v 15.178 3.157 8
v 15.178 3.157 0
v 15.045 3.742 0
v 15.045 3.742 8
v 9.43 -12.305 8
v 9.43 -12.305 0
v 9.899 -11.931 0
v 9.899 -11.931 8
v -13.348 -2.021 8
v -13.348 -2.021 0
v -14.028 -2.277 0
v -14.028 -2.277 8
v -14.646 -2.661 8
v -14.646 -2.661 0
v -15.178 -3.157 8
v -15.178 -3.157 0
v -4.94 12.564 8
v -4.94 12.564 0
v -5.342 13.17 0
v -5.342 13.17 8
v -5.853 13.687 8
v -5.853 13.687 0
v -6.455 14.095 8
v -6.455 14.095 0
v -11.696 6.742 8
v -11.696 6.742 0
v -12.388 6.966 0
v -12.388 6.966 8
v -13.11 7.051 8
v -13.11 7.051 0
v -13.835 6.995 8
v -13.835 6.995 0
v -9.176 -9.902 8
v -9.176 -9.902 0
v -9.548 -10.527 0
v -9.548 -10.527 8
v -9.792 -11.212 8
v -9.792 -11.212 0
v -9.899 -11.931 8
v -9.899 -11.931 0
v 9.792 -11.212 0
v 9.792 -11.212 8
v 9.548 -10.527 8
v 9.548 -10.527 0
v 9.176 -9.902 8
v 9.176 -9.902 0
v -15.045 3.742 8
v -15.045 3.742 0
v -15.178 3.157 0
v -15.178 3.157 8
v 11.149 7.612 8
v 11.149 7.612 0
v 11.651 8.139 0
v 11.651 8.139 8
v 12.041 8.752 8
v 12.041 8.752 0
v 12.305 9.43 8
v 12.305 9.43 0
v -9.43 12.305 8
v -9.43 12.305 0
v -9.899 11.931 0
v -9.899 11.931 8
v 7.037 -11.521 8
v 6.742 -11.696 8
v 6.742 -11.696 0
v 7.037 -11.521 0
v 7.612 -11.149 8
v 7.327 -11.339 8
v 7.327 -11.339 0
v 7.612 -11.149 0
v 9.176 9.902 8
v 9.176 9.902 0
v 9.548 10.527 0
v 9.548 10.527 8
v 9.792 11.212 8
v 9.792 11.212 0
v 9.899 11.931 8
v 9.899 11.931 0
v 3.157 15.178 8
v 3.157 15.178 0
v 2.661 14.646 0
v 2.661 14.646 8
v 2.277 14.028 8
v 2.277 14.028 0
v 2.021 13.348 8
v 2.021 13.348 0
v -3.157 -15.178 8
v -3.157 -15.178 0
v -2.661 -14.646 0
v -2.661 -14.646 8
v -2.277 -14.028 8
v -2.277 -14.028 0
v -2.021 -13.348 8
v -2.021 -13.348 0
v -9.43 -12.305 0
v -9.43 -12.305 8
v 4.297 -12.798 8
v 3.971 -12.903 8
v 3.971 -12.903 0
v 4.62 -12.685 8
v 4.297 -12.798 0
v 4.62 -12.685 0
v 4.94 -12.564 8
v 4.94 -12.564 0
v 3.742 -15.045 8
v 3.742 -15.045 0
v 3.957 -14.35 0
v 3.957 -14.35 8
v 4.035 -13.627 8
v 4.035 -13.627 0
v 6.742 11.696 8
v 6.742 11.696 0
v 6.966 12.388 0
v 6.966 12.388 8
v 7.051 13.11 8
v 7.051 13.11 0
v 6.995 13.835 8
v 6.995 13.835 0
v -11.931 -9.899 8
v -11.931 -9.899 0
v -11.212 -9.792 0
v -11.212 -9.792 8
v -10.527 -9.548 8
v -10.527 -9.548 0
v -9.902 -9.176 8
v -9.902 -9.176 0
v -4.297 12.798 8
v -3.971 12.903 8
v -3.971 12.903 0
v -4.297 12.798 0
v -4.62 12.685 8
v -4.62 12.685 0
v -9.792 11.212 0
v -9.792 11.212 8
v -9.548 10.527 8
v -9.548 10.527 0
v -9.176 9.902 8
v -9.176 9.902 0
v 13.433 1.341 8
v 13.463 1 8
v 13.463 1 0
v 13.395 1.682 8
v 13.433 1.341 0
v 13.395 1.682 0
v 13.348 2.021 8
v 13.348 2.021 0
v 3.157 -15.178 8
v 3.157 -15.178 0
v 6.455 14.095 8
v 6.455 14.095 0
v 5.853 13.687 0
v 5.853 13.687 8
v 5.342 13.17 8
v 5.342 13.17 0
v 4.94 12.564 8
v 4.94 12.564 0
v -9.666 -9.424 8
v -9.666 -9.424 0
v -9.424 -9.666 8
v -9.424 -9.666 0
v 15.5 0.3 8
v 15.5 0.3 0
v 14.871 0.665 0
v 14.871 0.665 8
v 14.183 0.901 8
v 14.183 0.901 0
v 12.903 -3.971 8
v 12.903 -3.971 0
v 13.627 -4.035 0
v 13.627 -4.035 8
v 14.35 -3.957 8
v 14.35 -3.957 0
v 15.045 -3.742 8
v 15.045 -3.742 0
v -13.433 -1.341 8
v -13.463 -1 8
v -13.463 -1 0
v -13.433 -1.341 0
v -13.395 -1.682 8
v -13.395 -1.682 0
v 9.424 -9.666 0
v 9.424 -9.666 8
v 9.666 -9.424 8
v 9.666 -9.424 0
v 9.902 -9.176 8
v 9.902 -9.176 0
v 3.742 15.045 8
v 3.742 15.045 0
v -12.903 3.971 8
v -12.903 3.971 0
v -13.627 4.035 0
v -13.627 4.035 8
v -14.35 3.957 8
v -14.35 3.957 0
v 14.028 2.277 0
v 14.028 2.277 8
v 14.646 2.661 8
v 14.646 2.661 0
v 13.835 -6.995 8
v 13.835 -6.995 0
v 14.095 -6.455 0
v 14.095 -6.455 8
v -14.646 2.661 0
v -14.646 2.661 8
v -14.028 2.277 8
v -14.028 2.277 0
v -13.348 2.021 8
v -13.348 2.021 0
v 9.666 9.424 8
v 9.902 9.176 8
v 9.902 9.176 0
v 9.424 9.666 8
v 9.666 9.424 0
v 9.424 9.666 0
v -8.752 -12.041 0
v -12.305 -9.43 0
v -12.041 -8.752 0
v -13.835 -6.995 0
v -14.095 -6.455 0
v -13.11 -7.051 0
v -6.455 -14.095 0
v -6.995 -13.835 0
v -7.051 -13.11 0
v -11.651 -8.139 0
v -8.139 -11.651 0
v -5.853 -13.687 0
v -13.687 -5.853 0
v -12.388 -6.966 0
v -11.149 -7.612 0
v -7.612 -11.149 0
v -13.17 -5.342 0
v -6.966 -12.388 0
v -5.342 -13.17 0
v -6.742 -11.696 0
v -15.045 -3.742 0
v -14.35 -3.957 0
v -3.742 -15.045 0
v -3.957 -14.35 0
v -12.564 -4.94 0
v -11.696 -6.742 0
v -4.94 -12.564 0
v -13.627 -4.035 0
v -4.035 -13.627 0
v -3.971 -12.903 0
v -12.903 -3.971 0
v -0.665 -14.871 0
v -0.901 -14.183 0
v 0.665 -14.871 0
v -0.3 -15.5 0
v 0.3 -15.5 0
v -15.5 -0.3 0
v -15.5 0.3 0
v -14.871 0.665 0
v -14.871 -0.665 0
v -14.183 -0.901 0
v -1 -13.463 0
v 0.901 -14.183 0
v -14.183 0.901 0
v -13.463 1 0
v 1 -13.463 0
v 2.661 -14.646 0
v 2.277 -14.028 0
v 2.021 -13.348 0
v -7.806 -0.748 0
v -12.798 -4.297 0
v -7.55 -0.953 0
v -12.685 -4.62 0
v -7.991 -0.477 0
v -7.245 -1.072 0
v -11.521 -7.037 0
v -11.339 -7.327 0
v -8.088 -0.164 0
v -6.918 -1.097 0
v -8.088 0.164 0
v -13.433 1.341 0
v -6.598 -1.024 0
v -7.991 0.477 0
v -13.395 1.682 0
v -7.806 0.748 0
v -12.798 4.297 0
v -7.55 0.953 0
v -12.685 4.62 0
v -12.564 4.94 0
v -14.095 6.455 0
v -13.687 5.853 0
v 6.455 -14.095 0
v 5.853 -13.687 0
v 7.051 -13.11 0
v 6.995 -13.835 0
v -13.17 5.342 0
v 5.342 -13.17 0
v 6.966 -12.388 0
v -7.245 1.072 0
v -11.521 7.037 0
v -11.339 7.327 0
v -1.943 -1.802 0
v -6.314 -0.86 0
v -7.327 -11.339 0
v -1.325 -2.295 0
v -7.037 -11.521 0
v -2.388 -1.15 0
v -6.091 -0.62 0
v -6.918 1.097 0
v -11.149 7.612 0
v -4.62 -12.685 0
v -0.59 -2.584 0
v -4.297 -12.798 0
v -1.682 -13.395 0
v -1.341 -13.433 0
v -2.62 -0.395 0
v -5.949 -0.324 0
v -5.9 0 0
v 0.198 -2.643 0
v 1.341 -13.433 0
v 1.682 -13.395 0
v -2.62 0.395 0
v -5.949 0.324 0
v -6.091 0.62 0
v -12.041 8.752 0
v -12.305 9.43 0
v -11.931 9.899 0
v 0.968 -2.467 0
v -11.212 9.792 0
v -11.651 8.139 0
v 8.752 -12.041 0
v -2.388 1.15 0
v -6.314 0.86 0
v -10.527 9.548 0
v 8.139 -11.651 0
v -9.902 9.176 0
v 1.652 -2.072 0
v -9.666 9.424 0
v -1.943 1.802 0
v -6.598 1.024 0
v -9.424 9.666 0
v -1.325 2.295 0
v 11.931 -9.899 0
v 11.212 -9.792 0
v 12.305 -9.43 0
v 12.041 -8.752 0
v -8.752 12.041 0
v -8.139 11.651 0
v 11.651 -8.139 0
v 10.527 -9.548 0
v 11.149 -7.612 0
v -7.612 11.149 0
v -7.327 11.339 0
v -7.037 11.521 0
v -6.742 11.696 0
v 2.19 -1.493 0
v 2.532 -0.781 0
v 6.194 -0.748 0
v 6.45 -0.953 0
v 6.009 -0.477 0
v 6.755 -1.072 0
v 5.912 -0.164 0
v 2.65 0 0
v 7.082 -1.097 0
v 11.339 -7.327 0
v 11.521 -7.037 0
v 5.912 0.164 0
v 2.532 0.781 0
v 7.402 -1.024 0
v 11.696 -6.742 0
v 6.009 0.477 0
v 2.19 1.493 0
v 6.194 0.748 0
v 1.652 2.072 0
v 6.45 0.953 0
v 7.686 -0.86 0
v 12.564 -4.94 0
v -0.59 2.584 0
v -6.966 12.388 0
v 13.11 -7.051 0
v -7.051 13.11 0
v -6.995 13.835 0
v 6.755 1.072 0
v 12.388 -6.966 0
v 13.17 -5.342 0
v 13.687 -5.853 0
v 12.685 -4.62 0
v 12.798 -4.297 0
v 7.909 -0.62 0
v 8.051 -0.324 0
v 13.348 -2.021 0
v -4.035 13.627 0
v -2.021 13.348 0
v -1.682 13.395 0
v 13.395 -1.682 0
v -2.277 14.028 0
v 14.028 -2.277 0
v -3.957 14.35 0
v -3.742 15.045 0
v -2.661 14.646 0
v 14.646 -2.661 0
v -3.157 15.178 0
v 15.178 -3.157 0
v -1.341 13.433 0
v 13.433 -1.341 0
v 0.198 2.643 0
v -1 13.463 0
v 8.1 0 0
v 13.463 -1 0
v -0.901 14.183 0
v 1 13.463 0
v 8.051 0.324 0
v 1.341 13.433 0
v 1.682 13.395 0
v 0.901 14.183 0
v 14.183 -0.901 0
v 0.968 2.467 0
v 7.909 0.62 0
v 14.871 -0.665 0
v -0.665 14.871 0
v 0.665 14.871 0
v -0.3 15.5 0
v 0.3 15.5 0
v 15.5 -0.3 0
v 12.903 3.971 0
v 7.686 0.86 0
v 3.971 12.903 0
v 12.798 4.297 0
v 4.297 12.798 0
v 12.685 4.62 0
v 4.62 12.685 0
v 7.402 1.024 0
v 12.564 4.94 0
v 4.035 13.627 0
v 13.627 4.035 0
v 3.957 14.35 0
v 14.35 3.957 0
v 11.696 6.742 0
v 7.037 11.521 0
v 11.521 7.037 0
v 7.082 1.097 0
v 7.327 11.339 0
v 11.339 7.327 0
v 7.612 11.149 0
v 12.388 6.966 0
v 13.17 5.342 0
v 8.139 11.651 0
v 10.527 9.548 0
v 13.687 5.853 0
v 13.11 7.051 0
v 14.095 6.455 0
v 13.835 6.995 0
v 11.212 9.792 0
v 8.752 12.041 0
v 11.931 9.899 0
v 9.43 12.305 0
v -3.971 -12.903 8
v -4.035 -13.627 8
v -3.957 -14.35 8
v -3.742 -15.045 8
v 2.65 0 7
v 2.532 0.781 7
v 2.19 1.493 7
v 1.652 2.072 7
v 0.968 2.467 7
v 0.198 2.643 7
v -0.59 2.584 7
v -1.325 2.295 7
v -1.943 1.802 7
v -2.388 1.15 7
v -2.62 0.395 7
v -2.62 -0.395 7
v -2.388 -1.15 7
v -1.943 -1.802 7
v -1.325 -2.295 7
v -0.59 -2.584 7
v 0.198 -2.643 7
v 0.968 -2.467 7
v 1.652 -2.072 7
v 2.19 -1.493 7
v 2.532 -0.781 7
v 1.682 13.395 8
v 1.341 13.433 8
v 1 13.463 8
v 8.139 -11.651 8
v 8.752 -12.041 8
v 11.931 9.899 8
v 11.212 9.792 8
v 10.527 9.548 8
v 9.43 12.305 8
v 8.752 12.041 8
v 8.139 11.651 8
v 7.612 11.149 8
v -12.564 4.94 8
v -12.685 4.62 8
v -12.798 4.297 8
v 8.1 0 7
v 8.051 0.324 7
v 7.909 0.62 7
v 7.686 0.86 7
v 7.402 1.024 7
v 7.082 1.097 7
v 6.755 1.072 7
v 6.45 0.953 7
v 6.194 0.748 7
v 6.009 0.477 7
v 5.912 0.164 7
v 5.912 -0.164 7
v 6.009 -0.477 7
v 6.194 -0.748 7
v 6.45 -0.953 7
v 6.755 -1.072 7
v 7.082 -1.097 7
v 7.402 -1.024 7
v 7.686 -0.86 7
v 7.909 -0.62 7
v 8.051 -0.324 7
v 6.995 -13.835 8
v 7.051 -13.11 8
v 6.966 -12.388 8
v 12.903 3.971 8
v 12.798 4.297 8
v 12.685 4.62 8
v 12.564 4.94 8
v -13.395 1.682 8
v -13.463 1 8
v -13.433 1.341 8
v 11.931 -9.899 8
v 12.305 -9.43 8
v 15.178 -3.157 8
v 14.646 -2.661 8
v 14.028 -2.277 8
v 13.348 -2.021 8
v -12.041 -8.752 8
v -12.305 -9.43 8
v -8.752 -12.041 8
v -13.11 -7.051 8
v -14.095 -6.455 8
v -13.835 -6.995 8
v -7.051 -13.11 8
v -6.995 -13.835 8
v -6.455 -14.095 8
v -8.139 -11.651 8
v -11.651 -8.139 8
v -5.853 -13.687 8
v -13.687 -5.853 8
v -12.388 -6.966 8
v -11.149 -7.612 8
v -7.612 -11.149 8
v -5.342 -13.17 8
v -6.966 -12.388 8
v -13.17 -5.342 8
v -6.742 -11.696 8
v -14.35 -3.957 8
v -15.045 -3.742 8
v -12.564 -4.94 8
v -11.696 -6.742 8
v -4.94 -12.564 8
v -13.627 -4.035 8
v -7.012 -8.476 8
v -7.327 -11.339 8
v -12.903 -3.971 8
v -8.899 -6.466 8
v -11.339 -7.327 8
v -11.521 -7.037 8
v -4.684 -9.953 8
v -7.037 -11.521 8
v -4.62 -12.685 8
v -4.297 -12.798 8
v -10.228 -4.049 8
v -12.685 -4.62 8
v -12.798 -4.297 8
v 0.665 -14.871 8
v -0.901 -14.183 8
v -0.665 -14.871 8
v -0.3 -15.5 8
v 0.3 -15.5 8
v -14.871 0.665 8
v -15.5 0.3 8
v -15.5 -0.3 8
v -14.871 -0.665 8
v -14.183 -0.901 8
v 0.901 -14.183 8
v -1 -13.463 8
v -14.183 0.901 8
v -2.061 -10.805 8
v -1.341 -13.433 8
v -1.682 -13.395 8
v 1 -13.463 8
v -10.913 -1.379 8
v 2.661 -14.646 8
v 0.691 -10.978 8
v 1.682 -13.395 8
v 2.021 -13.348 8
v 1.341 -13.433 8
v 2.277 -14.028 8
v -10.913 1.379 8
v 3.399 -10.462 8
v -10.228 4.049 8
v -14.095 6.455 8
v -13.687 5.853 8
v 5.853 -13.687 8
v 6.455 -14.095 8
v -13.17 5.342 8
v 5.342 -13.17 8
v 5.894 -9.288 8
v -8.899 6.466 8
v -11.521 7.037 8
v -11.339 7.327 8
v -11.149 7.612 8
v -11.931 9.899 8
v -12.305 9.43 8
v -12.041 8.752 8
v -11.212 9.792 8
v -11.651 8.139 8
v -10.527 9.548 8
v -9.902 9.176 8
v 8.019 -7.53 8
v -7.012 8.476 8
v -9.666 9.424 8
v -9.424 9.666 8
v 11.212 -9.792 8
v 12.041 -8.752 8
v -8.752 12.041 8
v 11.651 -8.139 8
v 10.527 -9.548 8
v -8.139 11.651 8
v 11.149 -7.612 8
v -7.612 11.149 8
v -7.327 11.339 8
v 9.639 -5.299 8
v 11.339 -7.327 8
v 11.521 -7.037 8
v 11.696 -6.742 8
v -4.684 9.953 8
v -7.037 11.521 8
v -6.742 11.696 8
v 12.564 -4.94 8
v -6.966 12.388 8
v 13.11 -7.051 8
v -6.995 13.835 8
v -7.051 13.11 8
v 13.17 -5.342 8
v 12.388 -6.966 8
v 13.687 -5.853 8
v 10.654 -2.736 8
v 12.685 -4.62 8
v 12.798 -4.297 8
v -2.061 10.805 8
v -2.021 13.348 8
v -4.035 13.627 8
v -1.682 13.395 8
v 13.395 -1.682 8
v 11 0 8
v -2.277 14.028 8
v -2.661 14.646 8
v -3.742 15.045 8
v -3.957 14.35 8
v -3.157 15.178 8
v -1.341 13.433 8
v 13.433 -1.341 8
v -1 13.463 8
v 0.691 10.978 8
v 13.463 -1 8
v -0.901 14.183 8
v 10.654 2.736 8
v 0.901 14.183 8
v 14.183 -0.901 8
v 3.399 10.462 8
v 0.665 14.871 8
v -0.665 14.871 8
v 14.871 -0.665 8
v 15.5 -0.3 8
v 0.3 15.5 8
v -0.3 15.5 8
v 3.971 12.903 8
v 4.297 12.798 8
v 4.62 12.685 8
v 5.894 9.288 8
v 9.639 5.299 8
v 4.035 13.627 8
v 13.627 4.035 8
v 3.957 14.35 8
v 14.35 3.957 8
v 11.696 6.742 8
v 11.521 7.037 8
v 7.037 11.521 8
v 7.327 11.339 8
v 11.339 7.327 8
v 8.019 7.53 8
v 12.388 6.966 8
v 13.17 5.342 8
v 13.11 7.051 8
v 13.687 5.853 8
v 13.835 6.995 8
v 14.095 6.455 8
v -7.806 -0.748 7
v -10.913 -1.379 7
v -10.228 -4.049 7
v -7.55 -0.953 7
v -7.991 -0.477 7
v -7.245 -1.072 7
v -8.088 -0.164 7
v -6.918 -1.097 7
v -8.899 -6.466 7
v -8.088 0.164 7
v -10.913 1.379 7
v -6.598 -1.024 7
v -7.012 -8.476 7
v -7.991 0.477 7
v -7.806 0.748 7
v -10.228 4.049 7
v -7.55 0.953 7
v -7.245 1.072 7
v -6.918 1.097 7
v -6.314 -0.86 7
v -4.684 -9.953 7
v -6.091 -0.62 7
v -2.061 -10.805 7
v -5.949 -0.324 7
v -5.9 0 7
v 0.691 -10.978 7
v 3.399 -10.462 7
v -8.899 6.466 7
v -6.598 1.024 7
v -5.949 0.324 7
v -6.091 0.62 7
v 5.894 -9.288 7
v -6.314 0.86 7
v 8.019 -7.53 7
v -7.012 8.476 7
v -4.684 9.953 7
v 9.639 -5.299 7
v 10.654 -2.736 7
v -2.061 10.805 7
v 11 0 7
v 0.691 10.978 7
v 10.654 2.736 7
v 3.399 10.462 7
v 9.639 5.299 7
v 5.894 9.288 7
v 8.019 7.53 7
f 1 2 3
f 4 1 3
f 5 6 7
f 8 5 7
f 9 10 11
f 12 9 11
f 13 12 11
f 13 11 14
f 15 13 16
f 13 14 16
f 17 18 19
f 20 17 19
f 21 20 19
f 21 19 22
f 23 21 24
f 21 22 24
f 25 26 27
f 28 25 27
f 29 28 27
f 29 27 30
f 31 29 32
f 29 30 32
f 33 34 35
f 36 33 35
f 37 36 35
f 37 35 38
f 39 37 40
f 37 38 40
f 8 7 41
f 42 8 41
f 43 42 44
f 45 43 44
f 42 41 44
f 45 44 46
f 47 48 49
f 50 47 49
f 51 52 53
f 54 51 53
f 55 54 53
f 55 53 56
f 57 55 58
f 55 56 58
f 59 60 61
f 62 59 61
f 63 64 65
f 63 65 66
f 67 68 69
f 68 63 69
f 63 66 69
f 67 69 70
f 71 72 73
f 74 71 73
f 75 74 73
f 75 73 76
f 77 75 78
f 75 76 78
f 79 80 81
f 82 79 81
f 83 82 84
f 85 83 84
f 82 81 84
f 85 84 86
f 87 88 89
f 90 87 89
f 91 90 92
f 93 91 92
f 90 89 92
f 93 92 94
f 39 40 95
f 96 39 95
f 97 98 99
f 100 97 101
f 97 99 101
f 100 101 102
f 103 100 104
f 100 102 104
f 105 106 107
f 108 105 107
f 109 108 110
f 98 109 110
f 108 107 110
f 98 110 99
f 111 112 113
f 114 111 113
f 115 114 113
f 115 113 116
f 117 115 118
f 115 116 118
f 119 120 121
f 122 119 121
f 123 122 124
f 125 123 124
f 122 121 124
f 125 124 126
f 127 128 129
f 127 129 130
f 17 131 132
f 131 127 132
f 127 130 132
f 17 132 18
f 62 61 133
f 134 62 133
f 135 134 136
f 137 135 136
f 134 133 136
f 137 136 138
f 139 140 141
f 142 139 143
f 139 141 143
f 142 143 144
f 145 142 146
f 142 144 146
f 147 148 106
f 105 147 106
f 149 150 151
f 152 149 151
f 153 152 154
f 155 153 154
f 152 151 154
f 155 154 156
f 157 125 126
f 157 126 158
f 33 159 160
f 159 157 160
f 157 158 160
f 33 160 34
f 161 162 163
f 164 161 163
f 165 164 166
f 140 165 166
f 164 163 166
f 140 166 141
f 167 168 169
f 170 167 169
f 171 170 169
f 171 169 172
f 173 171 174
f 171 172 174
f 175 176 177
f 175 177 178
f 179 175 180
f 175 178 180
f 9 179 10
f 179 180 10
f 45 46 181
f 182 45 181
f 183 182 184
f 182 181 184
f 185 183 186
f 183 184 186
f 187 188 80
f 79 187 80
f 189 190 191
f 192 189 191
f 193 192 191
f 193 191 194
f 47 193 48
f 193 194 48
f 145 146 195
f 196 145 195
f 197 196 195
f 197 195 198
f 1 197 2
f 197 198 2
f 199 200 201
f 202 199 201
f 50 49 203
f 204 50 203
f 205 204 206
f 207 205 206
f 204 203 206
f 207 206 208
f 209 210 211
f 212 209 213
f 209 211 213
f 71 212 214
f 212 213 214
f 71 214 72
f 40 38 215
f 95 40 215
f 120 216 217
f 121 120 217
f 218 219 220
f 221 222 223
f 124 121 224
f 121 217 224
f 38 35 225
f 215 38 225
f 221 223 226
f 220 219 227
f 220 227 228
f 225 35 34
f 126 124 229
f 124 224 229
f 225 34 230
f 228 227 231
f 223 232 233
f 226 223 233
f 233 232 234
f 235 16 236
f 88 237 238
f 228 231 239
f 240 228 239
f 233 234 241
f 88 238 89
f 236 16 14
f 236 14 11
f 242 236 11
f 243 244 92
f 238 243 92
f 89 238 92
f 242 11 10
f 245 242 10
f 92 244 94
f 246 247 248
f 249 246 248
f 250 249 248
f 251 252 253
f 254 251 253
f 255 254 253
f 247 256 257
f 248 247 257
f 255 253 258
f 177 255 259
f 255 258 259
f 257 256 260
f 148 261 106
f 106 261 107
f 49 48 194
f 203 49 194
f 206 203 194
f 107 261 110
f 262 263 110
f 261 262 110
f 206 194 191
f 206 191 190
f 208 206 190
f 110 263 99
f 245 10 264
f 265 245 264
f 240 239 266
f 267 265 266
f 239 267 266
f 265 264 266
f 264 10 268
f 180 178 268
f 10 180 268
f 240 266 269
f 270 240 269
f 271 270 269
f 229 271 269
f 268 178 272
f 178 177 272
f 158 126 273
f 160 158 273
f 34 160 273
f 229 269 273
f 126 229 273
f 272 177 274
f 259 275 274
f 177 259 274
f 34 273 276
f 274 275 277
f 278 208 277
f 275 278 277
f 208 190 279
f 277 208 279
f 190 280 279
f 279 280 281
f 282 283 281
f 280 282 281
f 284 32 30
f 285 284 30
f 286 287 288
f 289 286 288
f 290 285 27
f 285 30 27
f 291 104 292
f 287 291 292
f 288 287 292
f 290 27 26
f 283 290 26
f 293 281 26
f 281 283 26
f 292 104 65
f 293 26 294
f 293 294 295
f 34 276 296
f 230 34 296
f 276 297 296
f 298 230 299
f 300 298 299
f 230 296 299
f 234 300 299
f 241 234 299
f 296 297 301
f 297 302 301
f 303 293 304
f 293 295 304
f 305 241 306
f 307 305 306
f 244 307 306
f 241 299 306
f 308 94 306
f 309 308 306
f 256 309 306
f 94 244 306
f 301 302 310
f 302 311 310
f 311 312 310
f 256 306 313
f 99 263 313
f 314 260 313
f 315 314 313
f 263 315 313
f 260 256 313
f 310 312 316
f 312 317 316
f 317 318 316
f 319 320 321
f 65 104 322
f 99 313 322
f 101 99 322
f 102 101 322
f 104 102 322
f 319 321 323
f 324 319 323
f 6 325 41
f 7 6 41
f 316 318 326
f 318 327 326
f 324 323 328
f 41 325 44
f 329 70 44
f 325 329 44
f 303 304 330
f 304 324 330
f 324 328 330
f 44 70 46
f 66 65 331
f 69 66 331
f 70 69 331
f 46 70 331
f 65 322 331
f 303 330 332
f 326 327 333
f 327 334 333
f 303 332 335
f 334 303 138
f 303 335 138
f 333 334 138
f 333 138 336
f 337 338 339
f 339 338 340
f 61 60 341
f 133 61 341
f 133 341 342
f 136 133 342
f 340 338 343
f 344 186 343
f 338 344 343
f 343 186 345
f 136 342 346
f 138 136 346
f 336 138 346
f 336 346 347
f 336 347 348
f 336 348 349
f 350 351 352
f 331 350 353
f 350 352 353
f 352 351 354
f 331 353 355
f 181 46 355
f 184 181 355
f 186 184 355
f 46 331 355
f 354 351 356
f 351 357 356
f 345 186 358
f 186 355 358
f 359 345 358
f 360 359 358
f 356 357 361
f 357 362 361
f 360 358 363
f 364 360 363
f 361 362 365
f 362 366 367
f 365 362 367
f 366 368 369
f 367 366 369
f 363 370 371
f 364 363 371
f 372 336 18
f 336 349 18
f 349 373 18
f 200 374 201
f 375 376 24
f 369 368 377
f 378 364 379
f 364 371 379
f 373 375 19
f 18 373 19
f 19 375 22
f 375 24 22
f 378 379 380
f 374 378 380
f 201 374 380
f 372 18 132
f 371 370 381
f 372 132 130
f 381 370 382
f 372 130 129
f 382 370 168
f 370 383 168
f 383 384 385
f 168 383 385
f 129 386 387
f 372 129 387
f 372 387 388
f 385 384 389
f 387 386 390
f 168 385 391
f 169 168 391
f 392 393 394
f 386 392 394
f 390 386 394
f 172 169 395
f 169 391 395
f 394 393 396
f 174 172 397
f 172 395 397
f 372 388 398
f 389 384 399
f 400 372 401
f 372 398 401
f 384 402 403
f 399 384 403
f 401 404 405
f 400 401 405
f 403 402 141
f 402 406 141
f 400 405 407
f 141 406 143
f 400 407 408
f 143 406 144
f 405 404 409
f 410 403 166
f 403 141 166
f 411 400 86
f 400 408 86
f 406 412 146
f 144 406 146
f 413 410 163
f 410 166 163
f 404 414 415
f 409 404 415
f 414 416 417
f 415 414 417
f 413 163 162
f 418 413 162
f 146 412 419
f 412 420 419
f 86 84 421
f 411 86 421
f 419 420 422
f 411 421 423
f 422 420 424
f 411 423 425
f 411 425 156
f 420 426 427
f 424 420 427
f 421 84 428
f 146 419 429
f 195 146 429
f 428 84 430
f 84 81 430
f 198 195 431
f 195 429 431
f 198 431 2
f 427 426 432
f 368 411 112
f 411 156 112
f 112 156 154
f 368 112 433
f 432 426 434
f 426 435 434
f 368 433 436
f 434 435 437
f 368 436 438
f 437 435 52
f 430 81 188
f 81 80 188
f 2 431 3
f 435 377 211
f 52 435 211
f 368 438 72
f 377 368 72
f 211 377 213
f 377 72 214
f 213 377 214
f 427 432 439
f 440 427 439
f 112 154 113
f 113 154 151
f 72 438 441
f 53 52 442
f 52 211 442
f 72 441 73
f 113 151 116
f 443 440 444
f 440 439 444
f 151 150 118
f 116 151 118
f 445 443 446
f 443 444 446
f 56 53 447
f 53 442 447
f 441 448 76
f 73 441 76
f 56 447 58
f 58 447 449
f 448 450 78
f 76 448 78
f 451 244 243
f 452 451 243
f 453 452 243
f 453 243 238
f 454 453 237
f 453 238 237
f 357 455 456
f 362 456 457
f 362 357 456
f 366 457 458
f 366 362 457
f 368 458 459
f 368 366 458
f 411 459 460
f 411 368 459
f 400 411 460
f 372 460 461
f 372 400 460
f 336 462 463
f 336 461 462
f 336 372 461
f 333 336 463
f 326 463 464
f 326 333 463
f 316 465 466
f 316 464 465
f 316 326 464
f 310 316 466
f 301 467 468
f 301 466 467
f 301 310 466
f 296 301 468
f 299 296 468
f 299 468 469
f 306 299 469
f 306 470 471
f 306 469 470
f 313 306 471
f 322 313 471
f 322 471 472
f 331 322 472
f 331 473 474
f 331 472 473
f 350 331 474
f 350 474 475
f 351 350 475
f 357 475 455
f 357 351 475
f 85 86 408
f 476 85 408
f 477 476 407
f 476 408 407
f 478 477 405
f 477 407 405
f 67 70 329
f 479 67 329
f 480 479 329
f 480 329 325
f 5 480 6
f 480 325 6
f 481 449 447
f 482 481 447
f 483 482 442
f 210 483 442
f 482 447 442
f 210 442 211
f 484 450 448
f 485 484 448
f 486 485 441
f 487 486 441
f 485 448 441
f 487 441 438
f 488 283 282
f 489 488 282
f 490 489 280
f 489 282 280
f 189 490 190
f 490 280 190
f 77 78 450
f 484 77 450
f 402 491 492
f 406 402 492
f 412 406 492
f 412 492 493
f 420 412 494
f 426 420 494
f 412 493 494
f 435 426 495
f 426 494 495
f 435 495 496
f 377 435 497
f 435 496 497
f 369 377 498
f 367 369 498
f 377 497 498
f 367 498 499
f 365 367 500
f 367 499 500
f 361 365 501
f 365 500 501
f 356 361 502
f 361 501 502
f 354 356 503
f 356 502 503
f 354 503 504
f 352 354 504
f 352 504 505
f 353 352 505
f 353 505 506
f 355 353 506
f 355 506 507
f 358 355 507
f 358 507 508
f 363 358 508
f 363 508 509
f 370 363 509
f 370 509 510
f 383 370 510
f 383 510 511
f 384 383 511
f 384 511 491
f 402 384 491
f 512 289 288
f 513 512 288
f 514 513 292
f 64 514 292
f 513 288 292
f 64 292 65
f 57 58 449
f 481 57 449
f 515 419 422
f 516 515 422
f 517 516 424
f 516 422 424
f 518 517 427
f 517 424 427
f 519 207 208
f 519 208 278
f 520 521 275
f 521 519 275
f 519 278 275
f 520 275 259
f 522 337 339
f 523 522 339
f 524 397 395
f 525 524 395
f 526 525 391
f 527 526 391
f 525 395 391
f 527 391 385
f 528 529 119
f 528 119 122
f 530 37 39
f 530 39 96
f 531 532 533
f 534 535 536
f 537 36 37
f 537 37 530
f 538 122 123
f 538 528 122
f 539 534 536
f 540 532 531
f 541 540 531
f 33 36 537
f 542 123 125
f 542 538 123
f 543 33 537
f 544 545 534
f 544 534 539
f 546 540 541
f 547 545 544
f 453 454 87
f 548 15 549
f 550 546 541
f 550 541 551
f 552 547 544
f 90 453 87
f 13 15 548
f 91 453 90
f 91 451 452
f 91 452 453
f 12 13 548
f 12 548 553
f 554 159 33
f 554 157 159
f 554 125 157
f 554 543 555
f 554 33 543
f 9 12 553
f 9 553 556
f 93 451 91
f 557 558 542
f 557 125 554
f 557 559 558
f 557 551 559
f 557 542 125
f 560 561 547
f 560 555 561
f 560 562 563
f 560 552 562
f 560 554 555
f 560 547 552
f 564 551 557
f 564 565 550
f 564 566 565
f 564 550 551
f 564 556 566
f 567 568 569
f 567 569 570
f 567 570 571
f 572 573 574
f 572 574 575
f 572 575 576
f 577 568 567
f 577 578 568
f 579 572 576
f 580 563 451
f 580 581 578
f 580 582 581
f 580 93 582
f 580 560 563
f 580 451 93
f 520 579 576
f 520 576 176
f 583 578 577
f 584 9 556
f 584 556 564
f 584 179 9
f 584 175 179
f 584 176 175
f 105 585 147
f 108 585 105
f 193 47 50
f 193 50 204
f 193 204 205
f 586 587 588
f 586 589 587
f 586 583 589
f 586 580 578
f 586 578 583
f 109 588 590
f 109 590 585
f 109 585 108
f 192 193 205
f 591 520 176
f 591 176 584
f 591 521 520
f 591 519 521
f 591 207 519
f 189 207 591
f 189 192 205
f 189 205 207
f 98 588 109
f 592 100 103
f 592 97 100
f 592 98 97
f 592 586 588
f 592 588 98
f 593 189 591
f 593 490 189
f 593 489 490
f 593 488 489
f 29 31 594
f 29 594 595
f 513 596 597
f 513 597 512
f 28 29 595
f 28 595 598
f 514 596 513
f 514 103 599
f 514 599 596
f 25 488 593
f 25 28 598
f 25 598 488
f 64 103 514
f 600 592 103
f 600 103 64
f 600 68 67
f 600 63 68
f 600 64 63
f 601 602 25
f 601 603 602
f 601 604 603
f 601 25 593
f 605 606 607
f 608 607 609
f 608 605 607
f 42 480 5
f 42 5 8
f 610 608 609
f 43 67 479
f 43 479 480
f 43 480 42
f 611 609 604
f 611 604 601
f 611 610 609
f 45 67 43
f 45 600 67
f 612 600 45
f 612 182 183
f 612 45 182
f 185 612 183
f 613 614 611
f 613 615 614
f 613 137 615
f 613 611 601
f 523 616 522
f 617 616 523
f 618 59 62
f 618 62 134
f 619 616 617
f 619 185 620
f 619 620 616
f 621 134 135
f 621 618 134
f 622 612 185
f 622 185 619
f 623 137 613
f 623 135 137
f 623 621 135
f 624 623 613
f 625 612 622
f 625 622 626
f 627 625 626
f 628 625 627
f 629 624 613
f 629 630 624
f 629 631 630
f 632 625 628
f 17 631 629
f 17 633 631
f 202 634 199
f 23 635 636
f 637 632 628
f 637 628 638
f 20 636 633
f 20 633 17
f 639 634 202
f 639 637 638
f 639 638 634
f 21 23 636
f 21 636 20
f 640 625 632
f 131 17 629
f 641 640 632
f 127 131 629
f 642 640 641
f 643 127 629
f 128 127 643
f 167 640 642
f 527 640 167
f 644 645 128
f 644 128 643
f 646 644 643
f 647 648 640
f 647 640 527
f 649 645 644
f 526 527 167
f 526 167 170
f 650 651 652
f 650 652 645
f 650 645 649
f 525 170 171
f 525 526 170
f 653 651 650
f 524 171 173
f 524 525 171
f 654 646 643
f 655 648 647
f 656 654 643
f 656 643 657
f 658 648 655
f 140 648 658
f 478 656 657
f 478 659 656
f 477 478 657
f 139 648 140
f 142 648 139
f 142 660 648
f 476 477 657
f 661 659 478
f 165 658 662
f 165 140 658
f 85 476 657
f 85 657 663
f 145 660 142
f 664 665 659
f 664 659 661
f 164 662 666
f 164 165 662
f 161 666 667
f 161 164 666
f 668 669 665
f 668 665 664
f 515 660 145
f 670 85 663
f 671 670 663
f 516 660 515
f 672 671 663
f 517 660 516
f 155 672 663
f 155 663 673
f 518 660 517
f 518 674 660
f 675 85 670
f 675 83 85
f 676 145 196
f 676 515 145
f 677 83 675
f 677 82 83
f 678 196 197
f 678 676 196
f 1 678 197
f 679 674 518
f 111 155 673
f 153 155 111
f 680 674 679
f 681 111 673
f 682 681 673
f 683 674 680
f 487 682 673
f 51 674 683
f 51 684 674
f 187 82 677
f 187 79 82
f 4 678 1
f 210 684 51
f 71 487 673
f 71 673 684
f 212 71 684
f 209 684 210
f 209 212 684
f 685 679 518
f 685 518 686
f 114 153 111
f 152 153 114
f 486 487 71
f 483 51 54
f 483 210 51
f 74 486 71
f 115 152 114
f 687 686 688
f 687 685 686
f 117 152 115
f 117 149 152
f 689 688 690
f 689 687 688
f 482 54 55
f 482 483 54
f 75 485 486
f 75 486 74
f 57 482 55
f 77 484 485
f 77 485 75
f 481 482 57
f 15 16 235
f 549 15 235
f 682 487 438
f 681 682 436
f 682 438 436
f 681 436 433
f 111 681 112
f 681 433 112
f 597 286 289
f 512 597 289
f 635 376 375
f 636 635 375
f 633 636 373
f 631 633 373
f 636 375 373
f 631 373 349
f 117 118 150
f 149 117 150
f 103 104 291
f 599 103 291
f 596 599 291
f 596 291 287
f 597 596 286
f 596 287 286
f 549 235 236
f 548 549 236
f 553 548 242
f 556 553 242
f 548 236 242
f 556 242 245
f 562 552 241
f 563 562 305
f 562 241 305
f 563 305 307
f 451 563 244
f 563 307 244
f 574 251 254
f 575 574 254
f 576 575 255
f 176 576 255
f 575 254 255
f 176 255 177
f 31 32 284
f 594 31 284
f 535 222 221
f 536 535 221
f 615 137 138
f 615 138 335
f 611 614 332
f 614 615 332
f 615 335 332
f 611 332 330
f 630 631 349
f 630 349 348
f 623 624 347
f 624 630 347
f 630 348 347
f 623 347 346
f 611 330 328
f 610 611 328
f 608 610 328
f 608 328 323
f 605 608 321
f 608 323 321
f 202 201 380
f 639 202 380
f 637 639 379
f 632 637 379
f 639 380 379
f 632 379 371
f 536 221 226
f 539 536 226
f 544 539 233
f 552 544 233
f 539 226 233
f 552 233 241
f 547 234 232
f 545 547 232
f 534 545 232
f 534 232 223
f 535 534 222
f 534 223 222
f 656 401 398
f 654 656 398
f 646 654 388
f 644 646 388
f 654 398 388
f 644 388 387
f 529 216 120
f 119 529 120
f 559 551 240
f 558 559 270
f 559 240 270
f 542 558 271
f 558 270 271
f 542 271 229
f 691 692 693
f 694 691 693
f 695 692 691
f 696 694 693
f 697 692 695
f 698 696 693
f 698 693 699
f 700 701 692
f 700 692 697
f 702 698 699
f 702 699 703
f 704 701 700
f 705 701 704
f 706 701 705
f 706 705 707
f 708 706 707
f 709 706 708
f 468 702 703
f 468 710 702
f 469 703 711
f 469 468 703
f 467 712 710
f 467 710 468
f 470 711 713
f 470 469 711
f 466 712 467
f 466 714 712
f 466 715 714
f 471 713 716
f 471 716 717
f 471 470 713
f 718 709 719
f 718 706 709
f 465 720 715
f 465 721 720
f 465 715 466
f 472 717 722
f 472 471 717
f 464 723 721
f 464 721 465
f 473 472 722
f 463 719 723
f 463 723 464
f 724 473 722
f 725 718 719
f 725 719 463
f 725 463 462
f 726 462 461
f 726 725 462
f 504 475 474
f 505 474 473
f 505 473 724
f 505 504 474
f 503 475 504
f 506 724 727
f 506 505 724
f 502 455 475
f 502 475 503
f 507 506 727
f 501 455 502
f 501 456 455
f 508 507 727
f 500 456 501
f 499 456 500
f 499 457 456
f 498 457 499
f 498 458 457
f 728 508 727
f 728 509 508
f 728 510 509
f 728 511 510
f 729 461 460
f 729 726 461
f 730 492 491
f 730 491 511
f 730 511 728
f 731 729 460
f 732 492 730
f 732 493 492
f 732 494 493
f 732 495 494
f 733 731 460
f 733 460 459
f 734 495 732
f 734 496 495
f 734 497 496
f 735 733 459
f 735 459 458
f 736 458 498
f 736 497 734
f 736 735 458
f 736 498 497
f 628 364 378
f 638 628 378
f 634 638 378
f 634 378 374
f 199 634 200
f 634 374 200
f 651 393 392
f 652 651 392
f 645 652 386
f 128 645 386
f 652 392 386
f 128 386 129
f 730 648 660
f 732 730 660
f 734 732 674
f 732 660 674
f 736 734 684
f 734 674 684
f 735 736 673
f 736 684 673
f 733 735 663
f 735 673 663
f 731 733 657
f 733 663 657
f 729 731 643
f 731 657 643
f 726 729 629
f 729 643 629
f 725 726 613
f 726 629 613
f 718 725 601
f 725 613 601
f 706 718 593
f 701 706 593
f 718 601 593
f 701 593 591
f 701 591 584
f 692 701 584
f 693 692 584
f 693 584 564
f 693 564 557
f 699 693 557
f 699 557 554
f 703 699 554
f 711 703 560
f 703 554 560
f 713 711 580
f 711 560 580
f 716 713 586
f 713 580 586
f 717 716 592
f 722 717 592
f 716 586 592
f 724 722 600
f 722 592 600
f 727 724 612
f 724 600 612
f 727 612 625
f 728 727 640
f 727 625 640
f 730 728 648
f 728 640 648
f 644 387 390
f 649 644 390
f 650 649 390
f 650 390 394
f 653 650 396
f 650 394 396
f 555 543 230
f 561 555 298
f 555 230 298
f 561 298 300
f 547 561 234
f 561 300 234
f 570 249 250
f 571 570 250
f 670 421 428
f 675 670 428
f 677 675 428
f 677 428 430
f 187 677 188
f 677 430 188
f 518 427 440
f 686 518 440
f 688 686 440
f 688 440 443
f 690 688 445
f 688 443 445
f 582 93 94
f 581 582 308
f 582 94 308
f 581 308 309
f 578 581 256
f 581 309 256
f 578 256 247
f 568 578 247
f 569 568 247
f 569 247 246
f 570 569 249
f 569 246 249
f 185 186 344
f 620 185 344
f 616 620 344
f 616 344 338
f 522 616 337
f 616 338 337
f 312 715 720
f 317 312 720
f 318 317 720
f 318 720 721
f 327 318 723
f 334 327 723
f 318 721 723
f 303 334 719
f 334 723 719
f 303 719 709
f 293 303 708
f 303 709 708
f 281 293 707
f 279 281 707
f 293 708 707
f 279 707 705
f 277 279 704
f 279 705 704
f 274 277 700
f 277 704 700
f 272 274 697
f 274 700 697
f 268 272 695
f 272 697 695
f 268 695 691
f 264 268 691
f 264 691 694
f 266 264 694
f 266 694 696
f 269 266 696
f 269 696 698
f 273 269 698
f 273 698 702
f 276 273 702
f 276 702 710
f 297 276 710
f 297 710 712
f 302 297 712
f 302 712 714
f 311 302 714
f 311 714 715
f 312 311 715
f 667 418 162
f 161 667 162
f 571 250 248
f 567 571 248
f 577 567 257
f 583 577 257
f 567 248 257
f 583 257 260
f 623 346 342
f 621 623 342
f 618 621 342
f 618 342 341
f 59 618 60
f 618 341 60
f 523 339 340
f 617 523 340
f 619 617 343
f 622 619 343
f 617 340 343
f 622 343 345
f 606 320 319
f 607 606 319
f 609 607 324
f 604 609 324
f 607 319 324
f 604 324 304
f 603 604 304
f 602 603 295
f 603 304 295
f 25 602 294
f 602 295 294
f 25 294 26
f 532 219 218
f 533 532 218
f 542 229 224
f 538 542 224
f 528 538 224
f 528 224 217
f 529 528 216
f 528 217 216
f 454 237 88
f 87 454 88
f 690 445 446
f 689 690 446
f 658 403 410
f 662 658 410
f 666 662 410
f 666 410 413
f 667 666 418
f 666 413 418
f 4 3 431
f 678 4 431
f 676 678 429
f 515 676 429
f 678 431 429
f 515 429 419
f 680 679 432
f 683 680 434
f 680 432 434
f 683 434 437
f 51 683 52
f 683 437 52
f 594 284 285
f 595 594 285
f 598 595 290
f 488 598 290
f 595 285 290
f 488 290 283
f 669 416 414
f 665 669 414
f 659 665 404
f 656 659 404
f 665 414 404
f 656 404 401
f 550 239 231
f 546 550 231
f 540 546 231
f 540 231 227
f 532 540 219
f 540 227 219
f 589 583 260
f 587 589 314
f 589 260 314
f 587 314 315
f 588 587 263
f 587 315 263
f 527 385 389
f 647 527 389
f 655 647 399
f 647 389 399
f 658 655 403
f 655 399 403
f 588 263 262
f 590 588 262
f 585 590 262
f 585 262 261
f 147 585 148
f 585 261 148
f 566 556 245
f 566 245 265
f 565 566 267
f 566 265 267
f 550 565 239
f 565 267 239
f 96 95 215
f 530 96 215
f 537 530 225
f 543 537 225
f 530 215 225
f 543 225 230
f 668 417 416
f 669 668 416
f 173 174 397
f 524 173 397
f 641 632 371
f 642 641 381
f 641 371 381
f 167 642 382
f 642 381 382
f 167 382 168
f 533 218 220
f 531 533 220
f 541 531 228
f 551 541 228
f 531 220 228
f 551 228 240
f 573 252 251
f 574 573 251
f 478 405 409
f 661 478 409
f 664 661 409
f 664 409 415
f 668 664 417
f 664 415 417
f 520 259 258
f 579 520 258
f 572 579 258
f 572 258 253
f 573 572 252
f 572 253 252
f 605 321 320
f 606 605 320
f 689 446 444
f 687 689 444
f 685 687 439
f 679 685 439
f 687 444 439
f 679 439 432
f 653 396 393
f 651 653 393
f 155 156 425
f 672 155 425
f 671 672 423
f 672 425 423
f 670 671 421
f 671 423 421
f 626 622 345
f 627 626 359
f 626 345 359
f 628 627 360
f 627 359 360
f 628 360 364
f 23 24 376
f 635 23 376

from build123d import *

# Parameters (mm, degrees)
SKETCH2_R           = 2.65
BOSS_EXTRUDE1_DEPTH = 8
BOSS_EXTRUDE2_DEPTH = 8
CIRPATTERN1_COUNT   = 28
SKETCH3_R           = 11
CUT_EXTRUDE1_DEPTH  = 1
SKETCH4_R           = 1.1
CUT_EXTRUDE2_DEPTH  = 24.010866998


with BuildPart() as part:
    # Sketch2 → Boss-Extrude1 (new body)
    with BuildSketch(Plane.XY):
        with BuildLine():
            ThreePointArc((13.5, 0), (9.893179469, 9.185586535), (1, 13.462912018))
            ThreePointArc((1, 13.462912018), (0, 13.5), (-1, 13.462912018))
            ThreePointArc((-1, 13.462912018), (-9.185586535, -9.893179469), (13.5, 0))
        make_face()
        Circle(SKETCH2_R, mode=Mode.SUBTRACT)
    extrude(amount=BOSS_EXTRUDE1_DEPTH)

    # Sketch2<3> → Boss-Extrude2 (add)
    with BuildSketch(Plane.XY):
        with BuildLine():
            ThreePointArc((1, 13.462912018), (0.799796473, 14.532930237), (0.3, 15.5))
            Line((0.3, 15.5), (-0.3, 15.5))
            ThreePointArc((-0.3, 15.5), (-0.799796473, 14.532930237), (-1, 13.462912018))
            ThreePointArc((-1, 13.462912018), (0, 13.5), (1, 13.462912018))
        make_face()
    boss_extrude2 = extrude(amount=BOSS_EXTRUDE2_DEPTH)

    # CirPattern1: Boss-Extrude2 ×28 about axis
    cirpattern1_axis = Axis((0, 0, 8), (0, 0, 1))
    for i in range(1, CIRPATTERN1_COUNT):
        add(boss_extrude2.rotate(cirpattern1_axis, i * 360 / CIRPATTERN1_COUNT))

    # Sketch3 → Cut-Extrude1 (cut)
    with BuildSketch(Plane.XY.offset(8)):
        Circle(SKETCH3_R)
    extrude(amount=-CUT_EXTRUDE1_DEPTH, mode=Mode.SUBTRACT)

    # Sketch4 → Cut-Extrude2 (cut, through all)
    with BuildSketch(Plane.XY.offset(7)):
        with Locations((-7, 0)):
            Circle(SKETCH4_R)
        with Locations((7, 0)):
            Circle(SKETCH4_R)
    extrude(amount=-CUT_EXTRUDE2_DEPTH, mode=Mode.SUBTRACT)


solid = part.part
